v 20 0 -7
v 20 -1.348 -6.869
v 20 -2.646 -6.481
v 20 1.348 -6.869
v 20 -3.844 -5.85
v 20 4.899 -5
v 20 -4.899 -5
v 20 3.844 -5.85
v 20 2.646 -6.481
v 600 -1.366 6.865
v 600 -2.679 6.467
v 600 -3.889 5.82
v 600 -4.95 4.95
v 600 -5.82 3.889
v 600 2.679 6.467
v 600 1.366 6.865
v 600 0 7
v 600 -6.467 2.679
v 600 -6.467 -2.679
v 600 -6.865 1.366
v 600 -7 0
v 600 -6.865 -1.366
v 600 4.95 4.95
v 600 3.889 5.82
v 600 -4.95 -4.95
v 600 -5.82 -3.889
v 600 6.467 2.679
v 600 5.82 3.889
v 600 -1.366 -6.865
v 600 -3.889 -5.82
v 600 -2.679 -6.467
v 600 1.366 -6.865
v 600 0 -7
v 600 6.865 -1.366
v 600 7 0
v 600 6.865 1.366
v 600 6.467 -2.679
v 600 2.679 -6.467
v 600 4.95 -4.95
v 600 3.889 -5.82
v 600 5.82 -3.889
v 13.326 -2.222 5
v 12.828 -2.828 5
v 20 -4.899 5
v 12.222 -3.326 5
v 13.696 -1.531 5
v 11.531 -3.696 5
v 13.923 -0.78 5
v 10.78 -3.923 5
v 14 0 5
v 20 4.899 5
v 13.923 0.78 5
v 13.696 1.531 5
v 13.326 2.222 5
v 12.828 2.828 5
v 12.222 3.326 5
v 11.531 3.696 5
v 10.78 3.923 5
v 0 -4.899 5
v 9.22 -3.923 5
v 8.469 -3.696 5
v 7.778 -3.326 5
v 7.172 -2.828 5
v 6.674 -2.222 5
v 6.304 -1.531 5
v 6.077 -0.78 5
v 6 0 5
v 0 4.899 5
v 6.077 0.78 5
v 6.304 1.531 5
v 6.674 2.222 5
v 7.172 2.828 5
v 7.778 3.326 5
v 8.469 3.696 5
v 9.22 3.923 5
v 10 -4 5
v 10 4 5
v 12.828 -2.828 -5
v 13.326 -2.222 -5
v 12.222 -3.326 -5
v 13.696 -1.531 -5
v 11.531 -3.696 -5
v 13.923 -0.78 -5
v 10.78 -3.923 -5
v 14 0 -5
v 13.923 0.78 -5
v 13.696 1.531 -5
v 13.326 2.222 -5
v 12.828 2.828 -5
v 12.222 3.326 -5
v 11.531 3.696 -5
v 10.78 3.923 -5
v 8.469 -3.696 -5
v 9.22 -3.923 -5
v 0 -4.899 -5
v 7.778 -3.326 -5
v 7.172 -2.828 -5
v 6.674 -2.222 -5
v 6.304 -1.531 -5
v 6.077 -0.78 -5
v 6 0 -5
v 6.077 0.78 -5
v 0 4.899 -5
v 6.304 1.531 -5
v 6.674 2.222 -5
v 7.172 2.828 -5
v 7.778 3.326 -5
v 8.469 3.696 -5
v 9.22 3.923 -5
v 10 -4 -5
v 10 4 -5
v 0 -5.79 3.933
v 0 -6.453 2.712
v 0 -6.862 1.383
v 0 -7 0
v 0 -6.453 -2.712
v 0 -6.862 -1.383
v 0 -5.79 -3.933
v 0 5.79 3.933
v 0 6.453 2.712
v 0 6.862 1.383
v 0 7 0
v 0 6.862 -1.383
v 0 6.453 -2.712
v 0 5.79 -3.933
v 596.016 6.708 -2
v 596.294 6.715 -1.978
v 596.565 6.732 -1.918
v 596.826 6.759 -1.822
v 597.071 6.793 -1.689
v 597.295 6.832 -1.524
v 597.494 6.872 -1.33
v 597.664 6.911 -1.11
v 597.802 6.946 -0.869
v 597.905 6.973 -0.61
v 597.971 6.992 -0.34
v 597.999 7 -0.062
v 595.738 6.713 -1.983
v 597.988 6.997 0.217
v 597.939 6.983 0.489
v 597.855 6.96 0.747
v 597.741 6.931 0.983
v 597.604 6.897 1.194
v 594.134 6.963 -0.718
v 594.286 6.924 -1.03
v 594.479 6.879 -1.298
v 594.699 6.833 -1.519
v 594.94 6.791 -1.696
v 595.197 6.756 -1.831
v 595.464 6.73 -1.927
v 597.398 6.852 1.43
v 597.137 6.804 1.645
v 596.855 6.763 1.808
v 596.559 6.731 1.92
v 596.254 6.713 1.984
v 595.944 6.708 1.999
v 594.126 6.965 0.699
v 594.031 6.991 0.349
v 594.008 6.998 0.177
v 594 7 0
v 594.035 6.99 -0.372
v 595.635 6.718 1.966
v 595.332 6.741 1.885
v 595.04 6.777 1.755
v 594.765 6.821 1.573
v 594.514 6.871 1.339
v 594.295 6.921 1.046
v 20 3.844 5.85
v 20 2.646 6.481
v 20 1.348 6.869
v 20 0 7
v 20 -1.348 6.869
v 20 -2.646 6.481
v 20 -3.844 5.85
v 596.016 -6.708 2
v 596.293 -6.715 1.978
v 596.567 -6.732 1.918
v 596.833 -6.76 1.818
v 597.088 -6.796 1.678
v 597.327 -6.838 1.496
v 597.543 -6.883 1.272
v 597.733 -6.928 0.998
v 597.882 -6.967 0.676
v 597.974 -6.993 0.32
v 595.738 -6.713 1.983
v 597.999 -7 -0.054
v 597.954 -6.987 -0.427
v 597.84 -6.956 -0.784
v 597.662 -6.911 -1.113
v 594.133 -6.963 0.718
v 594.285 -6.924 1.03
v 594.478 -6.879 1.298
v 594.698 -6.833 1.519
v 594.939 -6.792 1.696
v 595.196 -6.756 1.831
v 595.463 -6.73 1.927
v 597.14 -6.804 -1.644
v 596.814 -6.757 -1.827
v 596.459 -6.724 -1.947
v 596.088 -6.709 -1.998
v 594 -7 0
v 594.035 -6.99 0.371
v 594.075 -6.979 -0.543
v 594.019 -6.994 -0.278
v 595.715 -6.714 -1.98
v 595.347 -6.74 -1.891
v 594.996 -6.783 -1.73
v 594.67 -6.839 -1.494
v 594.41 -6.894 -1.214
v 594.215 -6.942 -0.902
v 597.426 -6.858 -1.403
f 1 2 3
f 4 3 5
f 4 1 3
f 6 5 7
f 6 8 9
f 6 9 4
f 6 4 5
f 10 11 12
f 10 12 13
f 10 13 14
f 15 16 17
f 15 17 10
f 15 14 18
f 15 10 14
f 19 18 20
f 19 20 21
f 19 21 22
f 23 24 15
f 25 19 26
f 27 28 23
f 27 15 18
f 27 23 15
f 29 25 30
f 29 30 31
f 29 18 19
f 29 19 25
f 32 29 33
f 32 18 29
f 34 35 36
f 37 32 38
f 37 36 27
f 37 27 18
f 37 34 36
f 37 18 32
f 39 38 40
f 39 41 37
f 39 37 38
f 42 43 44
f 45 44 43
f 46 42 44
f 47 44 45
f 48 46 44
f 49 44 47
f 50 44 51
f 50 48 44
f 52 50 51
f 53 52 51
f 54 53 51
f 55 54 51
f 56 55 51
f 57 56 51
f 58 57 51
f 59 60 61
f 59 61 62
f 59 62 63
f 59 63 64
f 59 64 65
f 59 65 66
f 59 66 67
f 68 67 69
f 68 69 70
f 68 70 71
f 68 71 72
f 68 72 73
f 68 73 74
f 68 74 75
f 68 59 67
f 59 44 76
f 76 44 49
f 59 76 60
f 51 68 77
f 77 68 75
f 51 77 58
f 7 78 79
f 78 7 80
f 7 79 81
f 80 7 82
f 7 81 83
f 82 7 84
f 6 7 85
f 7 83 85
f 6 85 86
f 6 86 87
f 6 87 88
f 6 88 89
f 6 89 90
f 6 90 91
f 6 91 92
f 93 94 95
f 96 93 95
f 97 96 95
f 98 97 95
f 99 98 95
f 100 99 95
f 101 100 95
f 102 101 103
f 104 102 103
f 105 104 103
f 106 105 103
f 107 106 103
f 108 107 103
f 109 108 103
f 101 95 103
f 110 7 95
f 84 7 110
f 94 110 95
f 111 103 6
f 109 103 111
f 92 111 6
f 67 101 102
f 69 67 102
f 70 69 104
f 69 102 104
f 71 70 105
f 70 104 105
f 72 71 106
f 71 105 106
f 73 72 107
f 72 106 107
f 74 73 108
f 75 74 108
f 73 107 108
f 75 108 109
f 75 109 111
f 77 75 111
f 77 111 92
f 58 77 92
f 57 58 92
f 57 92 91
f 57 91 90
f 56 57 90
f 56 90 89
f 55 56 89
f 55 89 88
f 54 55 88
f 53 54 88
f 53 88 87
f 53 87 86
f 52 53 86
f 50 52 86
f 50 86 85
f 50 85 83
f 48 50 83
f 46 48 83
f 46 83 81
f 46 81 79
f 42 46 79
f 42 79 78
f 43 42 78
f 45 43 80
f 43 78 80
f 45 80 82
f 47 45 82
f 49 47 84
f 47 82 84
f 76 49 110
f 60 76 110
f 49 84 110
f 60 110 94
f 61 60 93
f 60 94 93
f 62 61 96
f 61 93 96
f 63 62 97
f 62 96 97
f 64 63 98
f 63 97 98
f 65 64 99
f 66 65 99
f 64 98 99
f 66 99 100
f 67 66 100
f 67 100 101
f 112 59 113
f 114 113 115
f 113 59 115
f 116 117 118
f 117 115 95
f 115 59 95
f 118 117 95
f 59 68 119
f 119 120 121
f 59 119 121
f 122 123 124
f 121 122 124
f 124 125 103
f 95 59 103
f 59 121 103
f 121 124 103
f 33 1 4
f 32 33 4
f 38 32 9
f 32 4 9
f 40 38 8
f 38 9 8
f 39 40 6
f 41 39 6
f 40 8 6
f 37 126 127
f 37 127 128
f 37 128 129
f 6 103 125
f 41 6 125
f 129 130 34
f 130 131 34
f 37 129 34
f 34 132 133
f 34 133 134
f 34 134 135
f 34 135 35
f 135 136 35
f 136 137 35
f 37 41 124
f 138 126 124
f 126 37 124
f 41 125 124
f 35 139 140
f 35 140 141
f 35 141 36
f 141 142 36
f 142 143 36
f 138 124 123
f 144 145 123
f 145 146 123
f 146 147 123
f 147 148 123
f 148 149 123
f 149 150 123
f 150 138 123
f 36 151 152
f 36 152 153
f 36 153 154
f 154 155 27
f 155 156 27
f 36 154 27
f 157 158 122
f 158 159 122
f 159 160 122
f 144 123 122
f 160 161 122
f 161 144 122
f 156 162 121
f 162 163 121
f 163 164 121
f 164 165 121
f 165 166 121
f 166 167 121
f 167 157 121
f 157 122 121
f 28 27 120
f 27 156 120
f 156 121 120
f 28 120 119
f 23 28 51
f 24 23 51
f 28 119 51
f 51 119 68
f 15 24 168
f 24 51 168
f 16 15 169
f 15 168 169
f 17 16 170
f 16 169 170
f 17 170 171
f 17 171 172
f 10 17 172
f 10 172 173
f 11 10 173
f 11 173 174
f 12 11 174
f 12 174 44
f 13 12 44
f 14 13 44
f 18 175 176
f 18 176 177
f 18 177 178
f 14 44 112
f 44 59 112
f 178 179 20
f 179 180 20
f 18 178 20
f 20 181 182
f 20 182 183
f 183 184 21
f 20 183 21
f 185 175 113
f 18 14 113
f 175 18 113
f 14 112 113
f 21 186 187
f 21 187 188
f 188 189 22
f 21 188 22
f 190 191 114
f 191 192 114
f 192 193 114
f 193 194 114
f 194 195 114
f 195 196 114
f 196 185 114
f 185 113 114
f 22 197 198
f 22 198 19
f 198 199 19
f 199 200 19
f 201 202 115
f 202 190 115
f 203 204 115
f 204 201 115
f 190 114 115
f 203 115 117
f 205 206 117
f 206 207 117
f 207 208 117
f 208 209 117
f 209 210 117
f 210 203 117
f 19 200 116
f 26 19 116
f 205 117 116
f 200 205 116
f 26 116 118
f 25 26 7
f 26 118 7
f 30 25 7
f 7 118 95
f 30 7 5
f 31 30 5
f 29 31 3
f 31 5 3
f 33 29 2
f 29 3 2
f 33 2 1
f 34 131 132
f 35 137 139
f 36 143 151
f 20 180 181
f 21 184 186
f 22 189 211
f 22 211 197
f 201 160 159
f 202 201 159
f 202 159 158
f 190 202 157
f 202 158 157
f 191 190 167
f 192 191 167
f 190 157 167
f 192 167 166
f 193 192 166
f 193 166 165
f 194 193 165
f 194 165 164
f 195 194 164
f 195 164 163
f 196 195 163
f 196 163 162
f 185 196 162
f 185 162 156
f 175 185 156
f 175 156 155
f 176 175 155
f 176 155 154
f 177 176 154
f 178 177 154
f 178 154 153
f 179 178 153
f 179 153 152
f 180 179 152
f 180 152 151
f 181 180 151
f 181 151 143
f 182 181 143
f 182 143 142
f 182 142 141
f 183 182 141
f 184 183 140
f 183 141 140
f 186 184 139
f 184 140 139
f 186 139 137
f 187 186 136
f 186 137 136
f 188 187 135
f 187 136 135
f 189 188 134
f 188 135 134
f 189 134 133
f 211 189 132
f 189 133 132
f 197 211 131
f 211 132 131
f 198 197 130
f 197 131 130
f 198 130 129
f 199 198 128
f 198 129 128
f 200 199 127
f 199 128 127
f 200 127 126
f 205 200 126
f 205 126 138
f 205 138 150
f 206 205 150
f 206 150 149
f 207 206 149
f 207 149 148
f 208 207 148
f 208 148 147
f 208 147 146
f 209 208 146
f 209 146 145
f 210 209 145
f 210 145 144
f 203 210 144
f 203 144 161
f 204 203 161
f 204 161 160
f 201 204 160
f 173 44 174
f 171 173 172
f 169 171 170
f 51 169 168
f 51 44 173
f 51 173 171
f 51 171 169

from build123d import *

# Parameters (mm, degrees)
SKETCH_1_R           = 7
EXTRUDE_1_DEPTH      = 600
SKETCH_3_OUTSIDE_W   = 136.066
SKETCH_3_OUTSIDE_H   = 136.066
SKETCH_3_OUTSIDE_W_2 = 10
SKETCH_3_OUTSIDE_H_2 = 20
CUT_EXTRUDE_1_DEPTH  = 20
SKETCH_4_R           = 4
CUT_EXTRUDE_3_DEPTH  = 20
SKETCH_5_R           = 2
CUT_EXTRUDE_4_DEPTH  = 15


with BuildPart() as part:
    # 草图1 → 凸台-拉伸1 (new body)
    with BuildSketch(Plane(origin=(0, 0, 0), x_dir=(0, 0, -1), z_dir=(1, 0, 0))):
        Circle(SKETCH_1_R)
    extrude(amount=EXTRUDE_1_DEPTH)

    # 草图3 outside → 切除-拉伸1 (cut)
    with BuildSketch(Plane.ZY):
        Rectangle(SKETCH_3_OUTSIDE_W, SKETCH_3_OUTSIDE_H)
        Rectangle(SKETCH_3_OUTSIDE_W_2, SKETCH_3_OUTSIDE_H_2, mode=Mode.SUBTRACT)
    extrude(amount=-CUT_EXTRUDE_1_DEPTH, mode=Mode.SUBTRACT)

    # 草图4 → 切除-拉伸3 (cut)
    with BuildSketch(Plane(origin=(0, 0, -5), x_dir=(-1, 0, 0), z_dir=(0, 0, -1))):
        with Locations((-10, 0)):
            Circle(SKETCH_4_R)
    extrude(amount=-CUT_EXTRUDE_3_DEPTH, mode=Mode.SUBTRACT)

    # 草图5 → 切除-拉伸4 (cut, through all)
    with BuildSketch(Plane(origin=(-583.138159927, 7, 1388.026133711), x_dir=(-1, 0, 0), z_dir=(0, 1, 0))):
        with Locations((-1179.138160513, -1388.026133214)):
            Circle(SKETCH_5_R)
    extrude(amount=-CUT_EXTRUDE_4_DEPTH, mode=Mode.SUBTRACT)


solid = part.part
